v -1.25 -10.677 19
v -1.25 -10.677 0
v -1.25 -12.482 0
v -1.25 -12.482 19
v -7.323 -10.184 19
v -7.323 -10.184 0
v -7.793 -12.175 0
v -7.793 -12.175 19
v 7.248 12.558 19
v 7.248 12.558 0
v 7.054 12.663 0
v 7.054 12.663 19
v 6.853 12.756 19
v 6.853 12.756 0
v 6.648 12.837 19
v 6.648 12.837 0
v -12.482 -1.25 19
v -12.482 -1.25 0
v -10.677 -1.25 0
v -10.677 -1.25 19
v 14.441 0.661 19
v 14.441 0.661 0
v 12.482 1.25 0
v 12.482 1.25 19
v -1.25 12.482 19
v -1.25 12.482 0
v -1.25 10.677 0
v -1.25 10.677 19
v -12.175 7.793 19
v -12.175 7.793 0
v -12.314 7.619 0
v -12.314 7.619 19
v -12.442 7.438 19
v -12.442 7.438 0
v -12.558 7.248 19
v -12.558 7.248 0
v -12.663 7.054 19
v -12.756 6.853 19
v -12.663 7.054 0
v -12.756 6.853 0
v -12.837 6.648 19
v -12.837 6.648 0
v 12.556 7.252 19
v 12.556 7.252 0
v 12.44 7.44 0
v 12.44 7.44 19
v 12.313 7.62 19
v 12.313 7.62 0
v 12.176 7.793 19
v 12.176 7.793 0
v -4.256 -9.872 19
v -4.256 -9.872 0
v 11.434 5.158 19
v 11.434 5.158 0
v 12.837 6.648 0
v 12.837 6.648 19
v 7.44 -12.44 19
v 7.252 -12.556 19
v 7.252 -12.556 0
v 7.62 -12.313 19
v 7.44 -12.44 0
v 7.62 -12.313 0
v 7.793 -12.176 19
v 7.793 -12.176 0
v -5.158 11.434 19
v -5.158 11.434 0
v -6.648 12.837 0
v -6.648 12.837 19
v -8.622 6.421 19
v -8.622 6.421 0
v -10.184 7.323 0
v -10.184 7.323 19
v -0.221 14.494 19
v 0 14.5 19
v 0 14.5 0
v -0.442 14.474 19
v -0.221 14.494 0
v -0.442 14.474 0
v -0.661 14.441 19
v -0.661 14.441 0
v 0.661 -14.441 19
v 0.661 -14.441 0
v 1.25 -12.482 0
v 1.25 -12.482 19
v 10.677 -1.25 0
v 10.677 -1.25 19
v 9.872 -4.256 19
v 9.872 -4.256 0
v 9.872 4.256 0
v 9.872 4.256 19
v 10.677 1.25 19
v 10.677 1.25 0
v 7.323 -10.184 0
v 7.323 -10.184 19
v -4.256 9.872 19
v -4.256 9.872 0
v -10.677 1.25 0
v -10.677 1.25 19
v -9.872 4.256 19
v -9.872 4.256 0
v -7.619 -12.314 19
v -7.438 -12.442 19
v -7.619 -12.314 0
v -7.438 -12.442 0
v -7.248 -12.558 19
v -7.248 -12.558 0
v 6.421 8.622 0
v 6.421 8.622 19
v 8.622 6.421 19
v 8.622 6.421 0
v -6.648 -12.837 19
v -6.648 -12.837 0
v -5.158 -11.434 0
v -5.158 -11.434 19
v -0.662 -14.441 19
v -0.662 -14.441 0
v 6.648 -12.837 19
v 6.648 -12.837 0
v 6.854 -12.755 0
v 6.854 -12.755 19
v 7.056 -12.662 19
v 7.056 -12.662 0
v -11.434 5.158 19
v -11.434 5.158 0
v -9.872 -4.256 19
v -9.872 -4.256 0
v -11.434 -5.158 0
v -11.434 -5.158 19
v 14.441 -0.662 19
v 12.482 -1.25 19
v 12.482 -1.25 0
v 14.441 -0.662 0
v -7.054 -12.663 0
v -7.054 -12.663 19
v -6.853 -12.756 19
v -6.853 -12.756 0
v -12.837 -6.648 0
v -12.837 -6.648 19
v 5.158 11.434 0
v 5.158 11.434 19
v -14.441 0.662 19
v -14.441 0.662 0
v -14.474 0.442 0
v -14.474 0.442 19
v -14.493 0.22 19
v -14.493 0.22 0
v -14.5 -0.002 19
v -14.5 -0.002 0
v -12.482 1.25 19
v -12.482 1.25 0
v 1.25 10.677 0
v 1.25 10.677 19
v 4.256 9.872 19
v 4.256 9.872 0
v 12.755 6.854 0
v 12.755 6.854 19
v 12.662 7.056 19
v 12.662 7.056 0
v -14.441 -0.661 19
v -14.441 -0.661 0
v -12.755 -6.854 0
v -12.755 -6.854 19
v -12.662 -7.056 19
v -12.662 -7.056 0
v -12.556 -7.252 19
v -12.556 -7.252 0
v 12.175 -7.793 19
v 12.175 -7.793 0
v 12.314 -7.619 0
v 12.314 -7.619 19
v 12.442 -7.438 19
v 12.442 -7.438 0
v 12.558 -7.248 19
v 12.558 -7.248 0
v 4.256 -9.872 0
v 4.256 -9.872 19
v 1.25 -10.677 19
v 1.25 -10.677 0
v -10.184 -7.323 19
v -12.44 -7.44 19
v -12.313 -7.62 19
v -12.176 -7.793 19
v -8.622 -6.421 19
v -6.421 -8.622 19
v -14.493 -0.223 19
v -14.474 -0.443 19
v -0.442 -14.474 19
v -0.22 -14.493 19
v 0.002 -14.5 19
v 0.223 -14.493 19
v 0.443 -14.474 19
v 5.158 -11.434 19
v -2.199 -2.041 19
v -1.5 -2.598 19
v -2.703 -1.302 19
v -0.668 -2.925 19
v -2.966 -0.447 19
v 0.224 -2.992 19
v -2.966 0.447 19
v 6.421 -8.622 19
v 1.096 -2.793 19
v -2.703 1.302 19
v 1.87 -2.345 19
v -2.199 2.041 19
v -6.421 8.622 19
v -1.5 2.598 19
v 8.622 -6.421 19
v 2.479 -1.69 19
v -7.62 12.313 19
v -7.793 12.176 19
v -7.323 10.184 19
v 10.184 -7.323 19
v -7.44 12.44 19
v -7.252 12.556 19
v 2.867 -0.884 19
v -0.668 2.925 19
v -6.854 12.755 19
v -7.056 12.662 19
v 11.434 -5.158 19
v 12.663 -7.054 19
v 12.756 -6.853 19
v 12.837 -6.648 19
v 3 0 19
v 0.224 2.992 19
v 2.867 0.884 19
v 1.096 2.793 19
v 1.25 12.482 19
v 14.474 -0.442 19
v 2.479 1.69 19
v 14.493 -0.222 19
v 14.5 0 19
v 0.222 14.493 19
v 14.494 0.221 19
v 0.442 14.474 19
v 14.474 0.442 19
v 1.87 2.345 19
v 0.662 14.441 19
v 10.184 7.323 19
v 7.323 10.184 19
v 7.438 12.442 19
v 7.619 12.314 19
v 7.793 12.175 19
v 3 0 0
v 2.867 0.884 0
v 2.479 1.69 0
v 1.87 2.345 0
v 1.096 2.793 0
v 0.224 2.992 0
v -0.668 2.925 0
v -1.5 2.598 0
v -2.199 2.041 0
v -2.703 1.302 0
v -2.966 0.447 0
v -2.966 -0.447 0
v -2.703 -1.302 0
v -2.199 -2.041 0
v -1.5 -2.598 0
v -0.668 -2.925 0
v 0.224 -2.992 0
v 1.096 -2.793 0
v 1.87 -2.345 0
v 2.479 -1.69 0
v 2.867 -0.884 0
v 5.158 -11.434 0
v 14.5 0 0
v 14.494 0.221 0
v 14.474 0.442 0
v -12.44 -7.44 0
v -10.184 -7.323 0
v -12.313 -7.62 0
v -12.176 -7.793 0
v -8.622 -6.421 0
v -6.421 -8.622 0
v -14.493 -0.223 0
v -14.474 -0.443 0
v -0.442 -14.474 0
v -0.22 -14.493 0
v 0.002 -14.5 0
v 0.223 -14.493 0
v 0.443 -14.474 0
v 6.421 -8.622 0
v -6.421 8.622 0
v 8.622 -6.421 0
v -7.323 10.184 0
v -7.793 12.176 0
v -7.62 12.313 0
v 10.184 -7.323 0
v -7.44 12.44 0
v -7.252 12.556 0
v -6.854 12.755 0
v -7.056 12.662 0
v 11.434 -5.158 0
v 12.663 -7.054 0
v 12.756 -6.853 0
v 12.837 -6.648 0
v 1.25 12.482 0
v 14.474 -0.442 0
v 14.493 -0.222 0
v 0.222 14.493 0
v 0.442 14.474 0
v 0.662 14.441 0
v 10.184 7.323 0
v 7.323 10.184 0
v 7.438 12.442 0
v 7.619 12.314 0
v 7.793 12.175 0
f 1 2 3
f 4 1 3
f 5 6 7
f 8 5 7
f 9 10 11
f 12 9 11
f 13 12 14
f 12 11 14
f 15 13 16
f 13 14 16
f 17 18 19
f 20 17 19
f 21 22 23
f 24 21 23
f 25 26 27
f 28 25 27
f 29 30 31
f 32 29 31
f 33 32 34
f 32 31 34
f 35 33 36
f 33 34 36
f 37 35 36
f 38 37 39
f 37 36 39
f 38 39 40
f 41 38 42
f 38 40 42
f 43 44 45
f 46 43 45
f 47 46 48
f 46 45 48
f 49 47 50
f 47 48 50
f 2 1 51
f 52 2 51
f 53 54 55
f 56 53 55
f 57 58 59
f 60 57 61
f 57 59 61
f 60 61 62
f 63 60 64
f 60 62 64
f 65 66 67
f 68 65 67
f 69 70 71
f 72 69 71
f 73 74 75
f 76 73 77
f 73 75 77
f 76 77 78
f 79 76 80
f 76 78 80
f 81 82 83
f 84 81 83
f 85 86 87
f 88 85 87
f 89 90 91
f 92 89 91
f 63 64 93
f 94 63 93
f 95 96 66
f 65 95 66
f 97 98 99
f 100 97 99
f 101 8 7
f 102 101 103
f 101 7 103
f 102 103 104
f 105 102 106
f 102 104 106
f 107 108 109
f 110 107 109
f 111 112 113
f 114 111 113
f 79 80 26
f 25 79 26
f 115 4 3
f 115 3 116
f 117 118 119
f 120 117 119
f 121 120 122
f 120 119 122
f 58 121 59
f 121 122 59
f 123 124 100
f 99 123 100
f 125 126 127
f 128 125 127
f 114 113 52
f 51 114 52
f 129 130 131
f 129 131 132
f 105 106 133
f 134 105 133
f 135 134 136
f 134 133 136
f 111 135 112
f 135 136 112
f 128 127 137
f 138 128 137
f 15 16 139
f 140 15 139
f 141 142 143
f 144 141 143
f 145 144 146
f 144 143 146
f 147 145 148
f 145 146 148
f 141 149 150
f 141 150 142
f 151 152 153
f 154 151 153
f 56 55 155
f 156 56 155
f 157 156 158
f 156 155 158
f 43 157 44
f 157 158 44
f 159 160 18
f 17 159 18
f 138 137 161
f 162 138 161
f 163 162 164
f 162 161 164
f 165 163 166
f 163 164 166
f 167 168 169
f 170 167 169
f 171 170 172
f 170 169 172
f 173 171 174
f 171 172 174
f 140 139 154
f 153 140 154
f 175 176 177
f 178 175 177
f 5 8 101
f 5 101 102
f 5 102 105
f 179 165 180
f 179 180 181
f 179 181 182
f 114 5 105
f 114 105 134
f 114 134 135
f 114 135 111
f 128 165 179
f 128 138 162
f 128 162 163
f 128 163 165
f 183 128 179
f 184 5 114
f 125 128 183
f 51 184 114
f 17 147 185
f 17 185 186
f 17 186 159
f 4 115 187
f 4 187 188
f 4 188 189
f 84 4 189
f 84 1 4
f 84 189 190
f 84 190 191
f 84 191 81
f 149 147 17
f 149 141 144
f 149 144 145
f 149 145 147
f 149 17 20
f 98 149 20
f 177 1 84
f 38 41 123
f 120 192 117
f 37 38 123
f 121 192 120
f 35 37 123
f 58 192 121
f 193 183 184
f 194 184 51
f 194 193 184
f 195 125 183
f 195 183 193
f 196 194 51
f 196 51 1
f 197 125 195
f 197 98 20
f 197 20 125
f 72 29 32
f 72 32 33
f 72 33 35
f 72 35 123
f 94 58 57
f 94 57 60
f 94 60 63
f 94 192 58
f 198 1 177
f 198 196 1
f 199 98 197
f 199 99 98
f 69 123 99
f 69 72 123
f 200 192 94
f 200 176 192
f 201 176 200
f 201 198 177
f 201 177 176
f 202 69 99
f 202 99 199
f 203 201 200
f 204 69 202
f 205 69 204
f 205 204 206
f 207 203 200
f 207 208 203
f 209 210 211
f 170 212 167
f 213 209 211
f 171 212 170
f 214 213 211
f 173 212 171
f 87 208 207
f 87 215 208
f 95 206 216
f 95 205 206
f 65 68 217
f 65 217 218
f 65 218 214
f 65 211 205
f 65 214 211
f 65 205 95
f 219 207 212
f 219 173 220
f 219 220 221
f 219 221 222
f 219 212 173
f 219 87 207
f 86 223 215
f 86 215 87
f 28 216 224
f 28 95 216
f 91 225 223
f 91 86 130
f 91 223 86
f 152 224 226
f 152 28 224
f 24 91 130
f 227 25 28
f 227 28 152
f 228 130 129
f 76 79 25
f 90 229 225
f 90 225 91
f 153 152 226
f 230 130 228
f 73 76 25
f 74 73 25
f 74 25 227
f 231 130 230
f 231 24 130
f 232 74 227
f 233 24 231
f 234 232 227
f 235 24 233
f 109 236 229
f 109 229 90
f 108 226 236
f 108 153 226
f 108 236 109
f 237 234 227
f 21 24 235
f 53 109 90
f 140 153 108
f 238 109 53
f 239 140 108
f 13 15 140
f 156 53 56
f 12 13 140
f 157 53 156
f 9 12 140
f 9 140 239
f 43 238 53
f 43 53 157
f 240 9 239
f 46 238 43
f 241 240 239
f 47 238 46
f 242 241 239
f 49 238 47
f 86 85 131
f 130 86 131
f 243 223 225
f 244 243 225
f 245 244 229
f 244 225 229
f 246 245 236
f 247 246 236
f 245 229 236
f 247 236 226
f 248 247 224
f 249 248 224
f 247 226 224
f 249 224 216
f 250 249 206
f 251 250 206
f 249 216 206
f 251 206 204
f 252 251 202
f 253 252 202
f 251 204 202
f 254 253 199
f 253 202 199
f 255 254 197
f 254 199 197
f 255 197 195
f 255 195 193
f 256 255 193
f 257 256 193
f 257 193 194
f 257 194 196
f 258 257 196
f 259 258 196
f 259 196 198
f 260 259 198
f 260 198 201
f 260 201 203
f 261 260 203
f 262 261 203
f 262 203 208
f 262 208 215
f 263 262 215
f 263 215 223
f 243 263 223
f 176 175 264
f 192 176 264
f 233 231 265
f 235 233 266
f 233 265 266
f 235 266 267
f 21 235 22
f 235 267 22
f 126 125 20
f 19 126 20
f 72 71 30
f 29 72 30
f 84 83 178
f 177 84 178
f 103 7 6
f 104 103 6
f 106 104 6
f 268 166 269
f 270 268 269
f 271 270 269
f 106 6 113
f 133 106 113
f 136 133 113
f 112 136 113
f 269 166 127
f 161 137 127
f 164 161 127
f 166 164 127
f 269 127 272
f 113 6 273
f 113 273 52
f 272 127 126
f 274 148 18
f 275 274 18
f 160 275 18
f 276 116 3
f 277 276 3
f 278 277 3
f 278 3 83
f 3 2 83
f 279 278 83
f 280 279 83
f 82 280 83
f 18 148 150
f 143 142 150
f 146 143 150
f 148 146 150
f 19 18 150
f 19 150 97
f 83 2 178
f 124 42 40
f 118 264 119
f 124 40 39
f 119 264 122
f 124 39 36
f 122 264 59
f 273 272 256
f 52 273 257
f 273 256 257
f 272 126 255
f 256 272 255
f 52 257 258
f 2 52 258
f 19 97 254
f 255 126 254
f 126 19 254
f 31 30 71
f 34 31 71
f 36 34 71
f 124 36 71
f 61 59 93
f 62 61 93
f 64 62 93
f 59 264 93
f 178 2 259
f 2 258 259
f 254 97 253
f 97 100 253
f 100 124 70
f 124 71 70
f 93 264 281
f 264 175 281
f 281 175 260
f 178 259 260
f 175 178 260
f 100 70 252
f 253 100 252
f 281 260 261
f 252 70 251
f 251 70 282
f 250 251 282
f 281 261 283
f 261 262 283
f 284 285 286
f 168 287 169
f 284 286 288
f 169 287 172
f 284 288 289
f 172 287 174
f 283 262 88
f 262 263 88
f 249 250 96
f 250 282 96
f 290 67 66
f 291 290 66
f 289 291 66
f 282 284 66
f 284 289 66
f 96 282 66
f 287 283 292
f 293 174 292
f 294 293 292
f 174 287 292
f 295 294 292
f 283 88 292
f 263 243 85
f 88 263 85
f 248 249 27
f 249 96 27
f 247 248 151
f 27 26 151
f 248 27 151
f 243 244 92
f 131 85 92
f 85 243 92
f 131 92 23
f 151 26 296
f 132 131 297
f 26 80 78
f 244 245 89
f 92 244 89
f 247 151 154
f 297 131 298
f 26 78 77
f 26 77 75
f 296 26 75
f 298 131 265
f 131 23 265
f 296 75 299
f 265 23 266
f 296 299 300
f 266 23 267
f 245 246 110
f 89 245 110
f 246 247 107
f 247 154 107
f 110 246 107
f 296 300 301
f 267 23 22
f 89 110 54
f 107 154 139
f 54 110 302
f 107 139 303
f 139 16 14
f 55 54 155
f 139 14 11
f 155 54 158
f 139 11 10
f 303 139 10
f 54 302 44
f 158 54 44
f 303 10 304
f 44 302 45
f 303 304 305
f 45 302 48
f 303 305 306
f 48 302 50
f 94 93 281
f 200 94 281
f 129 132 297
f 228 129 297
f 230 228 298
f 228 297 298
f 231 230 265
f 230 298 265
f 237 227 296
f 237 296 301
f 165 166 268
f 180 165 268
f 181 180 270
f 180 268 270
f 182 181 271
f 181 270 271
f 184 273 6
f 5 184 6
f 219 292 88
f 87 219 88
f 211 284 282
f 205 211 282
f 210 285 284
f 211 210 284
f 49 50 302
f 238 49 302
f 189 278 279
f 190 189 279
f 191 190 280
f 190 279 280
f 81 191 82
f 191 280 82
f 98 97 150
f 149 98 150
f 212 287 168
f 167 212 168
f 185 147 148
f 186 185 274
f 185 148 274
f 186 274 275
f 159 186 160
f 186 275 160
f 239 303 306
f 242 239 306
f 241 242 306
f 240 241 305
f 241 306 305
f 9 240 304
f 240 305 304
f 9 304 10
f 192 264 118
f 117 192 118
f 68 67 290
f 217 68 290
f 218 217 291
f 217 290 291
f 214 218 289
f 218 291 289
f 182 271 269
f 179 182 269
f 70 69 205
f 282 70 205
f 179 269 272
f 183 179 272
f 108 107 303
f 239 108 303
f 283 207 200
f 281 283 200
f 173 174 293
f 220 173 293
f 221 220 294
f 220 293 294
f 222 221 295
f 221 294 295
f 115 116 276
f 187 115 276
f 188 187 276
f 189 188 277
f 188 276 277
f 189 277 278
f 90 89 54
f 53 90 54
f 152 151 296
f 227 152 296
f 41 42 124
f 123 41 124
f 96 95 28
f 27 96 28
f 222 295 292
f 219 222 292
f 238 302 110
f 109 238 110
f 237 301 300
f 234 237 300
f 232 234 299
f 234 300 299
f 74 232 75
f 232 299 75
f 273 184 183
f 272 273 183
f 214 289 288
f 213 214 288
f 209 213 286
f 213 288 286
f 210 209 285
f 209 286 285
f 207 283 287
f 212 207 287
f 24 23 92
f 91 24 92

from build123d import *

# Parameters (mm, degrees)
F1_DEPTH = 19
F2_R     = 3
F3_DEPTH = 19.001
F5_DEPTH = 19.001


with BuildPart() as f1:
    # F0 (on Top) → F1 (new body)
    with BuildSketch(Plane.XY):
        with BuildLine():
            ThreePointArc((0.6615248327, 14.4409431122), (0.3320724143, 14.4851453928), (-1e-10, 14.4999996592))
            ThreePointArc((-1e-10, 14.4999996592), (-0.3319821514, 14.4853981451), (-0.6613682325, 14.44146453))
            Line((-0.6613682325, 14.44146453), (-1.25, 12.4815492326))
            Line((-1.25, 12.4815492326), (-1.25, 10.677078252))
            ThreePointArc((-1.25, 10.677078252), (-2.7823047349, 10.3837026326), (-4.2560073713, 9.8716210045))
            ThreePointArc((-4.2560073713, 9.8716210045), (-5.375, 9.3097730907), (-6.4210708807, 8.6216210045))
            ThreePointArc((-6.4210708807, 8.6216210045), (-7.6013978978, 7.6013978978), (-8.6216210045, 6.4210708807))
            ThreePointArc((-8.6216210045, 6.4210708807), (-9.3097730907, 5.375), (-9.8716210045, 4.2560073713))
            ThreePointArc((-9.8716210045, 4.2560073713), (-10.3837026326, 2.7823047349), (-10.677078252, 1.25))
            ThreePointArc((-10.677078252, 1.25), (-10.75, 0), (-10.677078252, -1.25))
            ThreePointArc((-10.677078252, -1.25), (-10.3837026326, -2.7823047349), (-9.8716210045, -4.2560073713))
            ThreePointArc((-9.8716210045, -4.2560073713), (-9.3097730907, -5.375), (-8.6216210045, -6.4210708807))
            ThreePointArc((-8.6216210045, -6.4210708807), (-7.6013978978, -7.6013978978), (-6.4210708807, -8.6216210045))
            ThreePointArc((-6.4210708807, -8.6216210045), (-5.375, -9.3097730907), (-4.2560073713, -9.8716210045))
            ThreePointArc((-4.2560073713, -9.8716210045), (-2.7823047349, -10.3837026326), (-1.25, -10.677078252))
            ThreePointArc((-1.25, -10.677078252), (0, -10.75), (1.25, -10.677078252))
            ThreePointArc((1.25, -10.677078252), (2.7823047349, -10.3837026326), (4.2560073713, -9.8716210045))
            ThreePointArc((4.2560073713, -9.8716210045), (5.375, -9.3097730907), (6.4210708807, -8.6216210045))
            ThreePointArc((6.4210708807, -8.6216210045), (7.6013978978, -7.6013978978), (8.6216210045, -6.4210708807))
            ThreePointArc((8.6216210045, -6.4210708807), (9.3097730907, -5.375), (9.8716210045, -4.2560073713))
            ThreePointArc((9.8716210045, -4.2560073713), (10.3837026326, -2.7823047349), (10.677078252, -1.25))
            ThreePointArc((10.677078252, -1.25), (10.75, 0), (10.677078252, 1.25))
            ThreePointArc((10.677078252, 1.25), (10.3837026326, 2.7823047349), (9.8716210045, 4.2560073713))
            ThreePointArc((9.8716210045, 4.2560073713), (9.3097730907, 5.375), (8.6216210045, 6.4210708807))
            ThreePointArc((8.6216210045, 6.4210708807), (7.6013978978, 7.6013978978), (6.4210708807, 8.6216210045))
            ThreePointArc((6.4210708807, 8.6216210045), (5.375, 9.3097730907), (4.2560073713, 9.8716210045))
            ThreePointArc((4.2560073713, 9.8716210045), (2.7823047349, 10.3837026326), (1.25, 10.677078252))
            Line((1.25, 10.677078252), (1.25, 12.4815492326))
            Line((1.25, 12.4815492326), (0.6615248327, 14.4409431122))
        make_face()
        with BuildLine():
            ThreePointArc((-6.6475742458, 12.8369860061), (-6.9558312731, 12.7101492794), (-7.2516073314, 12.5564402245))
            ThreePointArc((-7.2516073314, 12.5564402245), (-7.530963641, 12.3781985459), (-7.7934939556, 12.1759910346))
            Line((-7.7934939556, 12.1759910346), (-7.323306371, 10.184338714))
            Line((-7.323306371, 10.184338714), (-6.4210708807, 8.6216210045))
            ThreePointArc((-6.4210708807, 8.6216210045), (-5.375, 9.3097730907), (-4.2560073713, 9.8716210045))
            Line((-4.2560073713, 9.8716210045), (-5.1582428616, 11.434338714))
            Line((-5.1582428616, 11.434338714), (-6.6475742458, 12.8369860061))
        make_face()
        with BuildLine():
            ThreePointArc((-12.1754611735, 7.7933688665), (-12.3790012127, 7.5293965451), (-12.5582962553, 7.2483925918))
            ThreePointArc((-12.5582962553, 7.2483925918), (-12.7111050909, 6.9543525953), (-12.8373592671, 6.6479705744))
            Line((-12.8373592671, 6.6479705744), (-11.434338714, 5.1582428616))
            Line((-11.434338714, 5.1582428616), (-9.8716210045, 4.2560073713))
            ThreePointArc((-9.8716210045, 4.2560073713), (-9.3097730907, 5.375), (-8.6216210045, 6.4210708807))
            Line((-8.6216210045, 6.4210708807), (-10.184338714, 7.323306371))
            Line((-10.184338714, 7.323306371), (-12.1754611735, 7.7933688665))
        make_face()
        with BuildLine():
            ThreePointArc((-14.4409431122, 0.6615248327), (-14.4852278378, 0.3311476102), (-14.4999998811, -0.0018569436))
            ThreePointArc((-14.4999998811, -0.0018569436), (-14.4853161751, -0.3329069977), (-14.44146453, -0.6613682325))
            Line((-14.44146453, -0.6613682325), (-12.4815492326, -1.25))
            Line((-12.4815492326, -1.25), (-10.677078252, -1.25))
            ThreePointArc((-10.677078252, -1.25), (-10.75, 0), (-10.677078252, 1.25))
            Line((-10.677078252, 1.25), (-12.4815492326, 1.25))
            Line((-12.4815492326, 1.25), (-14.4409431122, 0.6615248327))
        make_face()
        with BuildLine():
            ThreePointArc((7.7933688665, 12.1754611735), (7.5293965654, 12.3790011985), (7.2483926348, 12.5582962304))
            ThreePointArc((7.2483926348, 12.5582962304), (6.9543526178, 12.7111050804), (6.6479705744, 12.8373592671))
            Line((6.6479705744, 12.8373592671), (5.1582428616, 11.434338714))
            Line((5.1582428616, 11.434338714), (4.2560073713, 9.8716210045))
            ThreePointArc((4.2560073713, 9.8716210045), (5.375, 9.3097730907), (6.4210708807, 8.6216210045))
            Line((6.4210708807, 8.6216210045), (7.323306371, 10.184338714))
            Line((7.323306371, 10.184338714), (7.7933688665, 12.1754611735))
        make_face()
        with BuildLine():
            ThreePointArc((12.8369860061, 6.6475742458), (12.7101492794, 6.9558312731), (12.5564402245, 7.2516073314))
            ThreePointArc((12.5564402245, 7.2516073314), (12.3781985459, 7.530963641), (12.1759910346, 7.7934939556))
            Line((12.1759910346, 7.7934939556), (10.184338714, 7.323306371))
            Line((10.184338714, 7.323306371), (8.6216210045, 6.4210708807))
            ThreePointArc((8.6216210045, 6.4210708807), (9.3097730907, 5.375), (9.8716210045, 4.2560073713))
            Line((9.8716210045, 4.2560073713), (11.434338714, 5.1582428616))
            Line((11.434338714, 5.1582428616), (12.8369860061, 6.6475742458))
        make_face()
        with BuildLine():
            ThreePointArc((14.4409431122, -0.6615248327), (14.4851453928, -0.3320724143), (14.4999996592, 1e-10))
            ThreePointArc((14.4999996592, 1e-10), (14.4853981451, 0.3319821514), (14.44146453, 0.6613682325))
            Line((14.44146453, 0.6613682325), (12.4815492326, 1.25))
            Line((12.4815492326, 1.25), (10.677078252, 1.25))
            ThreePointArc((10.677078252, 1.25), (10.75, 0), (10.677078252, -1.25))
            Line((10.677078252, -1.25), (12.4815492326, -1.25))
            Line((12.4815492326, -1.25), (14.4409431122, -0.6615248327))
        make_face()
        with BuildLine():
            ThreePointArc((-0.6615248327, -14.4409431122), (-0.3311477424, -14.485227826), (0.0018566781, -14.4999998811))
            ThreePointArc((0.0018566781, -14.4999998811), (0.3329068655, -14.4853161868), (0.6613682325, -14.44146453))
            Line((0.6613682325, -14.44146453), (1.25, -12.4815492326))
            Line((1.25, -12.4815492326), (1.25, -10.677078252))
            ThreePointArc((1.25, -10.677078252), (0, -10.75), (-1.25, -10.677078252))
            Line((-1.25, -10.677078252), (-1.25, -12.4815492326))
            Line((-1.25, -12.4815492326), (-0.6615248327, -14.4409431122))
        make_face()
        with BuildLine():
            ThreePointArc((-7.7933688665, -12.1754611735), (-7.5293965528, -12.3790012073), (-7.2483926082, -12.5582962458))
            ThreePointArc((-7.2483926082, -12.5582962458), (-6.9543526039, -12.7111050869), (-6.6479705744, -12.8373592671))
            Line((-6.6479705744, -12.8373592671), (-5.1582428616, -11.434338714))
            Line((-5.1582428616, -11.434338714), (-4.2560073713, -9.8716210045))
            ThreePointArc((-4.2560073713, -9.8716210045), (-5.375, -9.3097730907), (-6.4210708807, -8.6216210045))
            Line((-6.4210708807, -8.6216210045), (-7.323306371, -10.184338714))
            Line((-7.323306371, -10.184338714), (-7.7933688665, -12.1754611735))
        make_face()
        with BuildLine():
            ThreePointArc((-12.8369860061, -6.6475742458), (-12.7101492695, -6.9558312944), (-12.5564402011, -7.251607372))
            ThreePointArc((-12.5564402011, -7.251607372), (-12.3781985325, -7.5309636602), (-12.1759910346, -7.7934939556))
            Line((-12.1759910346, -7.7934939556), (-10.184338714, -7.323306371))
            Line((-10.184338714, -7.323306371), (-8.6216210045, -6.4210708807))
            ThreePointArc((-8.6216210045, -6.4210708807), (-9.3097730907, -5.375), (-9.8716210045, -4.2560073713))
            Line((-9.8716210045, -4.2560073713), (-11.434338714, -5.1582428616))
            Line((-11.434338714, -5.1582428616), (-12.8369860061, -6.6475742458))
        make_face()
        with BuildLine():
            ThreePointArc((12.1754611735, -7.7933688665), (12.3790011928, -7.5293965734), (12.5582962206, -7.2483926518))
            ThreePointArc((12.5582962206, -7.2483926518), (12.7111050763, -6.9543526268), (12.8373592671, -6.6479705744))
            Line((12.8373592671, -6.6479705744), (11.434338714, -5.1582428616))
            Line((11.434338714, -5.1582428616), (9.8716210045, -4.2560073713))
            ThreePointArc((9.8716210045, -4.2560073713), (9.3097730907, -5.375), (8.6216210045, -6.4210708807))
            Line((8.6216210045, -6.4210708807), (10.184338714, -7.323306371))
            Line((10.184338714, -7.323306371), (12.1754611735, -7.7933688665))
        make_face()
        with BuildLine():
            ThreePointArc((6.6475742458, -12.8369860061), (6.9558313313, -12.7101492523), (7.2516074425, -12.5564401603))
            ThreePointArc((7.2516074425, -12.5564401603), (7.5309636935, -12.3781985091), (7.7934939556, -12.1759910346))
            Line((7.7934939556, -12.1759910346), (7.323306371, -10.184338714))
            Line((7.323306371, -10.184338714), (6.4210708807, -8.6216210045))
            ThreePointArc((6.4210708807, -8.6216210045), (5.375, -9.3097730907), (4.2560073713, -9.8716210045))
            Line((4.2560073713, -9.8716210045), (5.1582428616, -11.434338714))
            Line((5.1582428616, -11.434338714), (6.6475742458, -12.8369860061))
        make_face()
    extrude(amount=F1_DEPTH)

    # F2 (on face) → F3 (cut, through all)
    with BuildSketch(Plane.XY.offset(19)):
        Circle(F2_R)
    extrude(amount=-F3_DEPTH, mode=Mode.SUBTRACT)

    # F4 (on face) → F5 (cut, through all)
    with BuildSketch(Plane.XY.offset(19)):
        with BuildLine():
            Line((-10.677078252, 1.25), (-9.8716210045, 4.2560073713))
            ThreePointArc((-9.8716210045, 4.2560073713), (-10.3837026326, 2.7823047349), (-10.677078252, 1.25))
        make_face()
        with BuildLine():
            Line((-9.8716210045, -4.2560073713), (-10.677078252, -1.25))
            ThreePointArc((-10.677078252, -1.25), (-10.3837026326, -2.7823047349), (-9.8716210045, -4.2560073713))
        make_face()
        with BuildLine():
            Line((-8.6216210045, 6.4210708807), (-6.4210708807, 8.6216210045))
            ThreePointArc((-6.4210708807, 8.6216210045), (-7.6013978978, 7.6013978978), (-8.6216210045, 6.4210708807))
        make_face()
        with BuildLine():
            Line((-4.2560073713, 9.8716210045), (-1.25, 10.677078252))
            ThreePointArc((-1.25, 10.677078252), (-2.7823047349, 10.3837026326), (-4.2560073713, 9.8716210045))
        make_face()
        with BuildLine():
            ThreePointArc((4.2560073713, 9.8716210045), (2.7823047349, 10.3837026326), (1.25, 10.677078252))
            Line((1.25, 10.677078252), (4.2560073713, 9.8716210045))
        make_face()
        with BuildLine():
            ThreePointArc((8.6216210045, 6.4210708807), (7.6013978978, 7.6013978978), (6.4210708807, 8.6216210045))
            Line((6.4210708807, 8.6216210045), (8.6216210045, 6.4210708807))
        make_face()
        with BuildLine():
            ThreePointArc((10.677078252, 1.25), (10.3837026326, 2.7823047349), (9.8716210045, 4.2560073713))
            Line((9.8716210045, 4.2560073713), (10.677078252, 1.25))
        make_face()
        with BuildLine():
            ThreePointArc((9.8716210045, -4.2560073713), (10.3837026326, -2.7823047349), (10.677078252, -1.25))
            Line((10.677078252, -1.25), (9.8716210045, -4.2560073713))
        make_face()
        with BuildLine():
            ThreePointArc((6.4210708807, -8.6216210045), (7.6013978978, -7.6013978978), (8.6216210045, -6.4210708807))
            Line((8.6216210045, -6.4210708807), (6.4210708807, -8.6216210045))
        make_face()
        with BuildLine():
            ThreePointArc((1.25, -10.677078252), (2.7823047349, -10.3837026326), (4.2560073713, -9.8716210045))
            Line((4.2560073713, -9.8716210045), (1.25, -10.677078252))
        make_face()
        with BuildLine():
            Line((-1.25, -10.677078252), (-4.2560073713, -9.8716210045))
            ThreePointArc((-4.2560073713, -9.8716210045), (-2.7823047349, -10.3837026326), (-1.25, -10.677078252))
        make_face()
        with BuildLine():
            Line((-6.4210708807, -8.6216210045), (-8.6216210045, -6.4210708807))
            ThreePointArc((-8.6216210045, -6.4210708807), (-7.6013978978, -7.6013978978), (-6.4210708807, -8.6216210045))
        make_face()
    extrude(amount=-F5_DEPTH, mode=Mode.SUBTRACT)


solid = f1.part
